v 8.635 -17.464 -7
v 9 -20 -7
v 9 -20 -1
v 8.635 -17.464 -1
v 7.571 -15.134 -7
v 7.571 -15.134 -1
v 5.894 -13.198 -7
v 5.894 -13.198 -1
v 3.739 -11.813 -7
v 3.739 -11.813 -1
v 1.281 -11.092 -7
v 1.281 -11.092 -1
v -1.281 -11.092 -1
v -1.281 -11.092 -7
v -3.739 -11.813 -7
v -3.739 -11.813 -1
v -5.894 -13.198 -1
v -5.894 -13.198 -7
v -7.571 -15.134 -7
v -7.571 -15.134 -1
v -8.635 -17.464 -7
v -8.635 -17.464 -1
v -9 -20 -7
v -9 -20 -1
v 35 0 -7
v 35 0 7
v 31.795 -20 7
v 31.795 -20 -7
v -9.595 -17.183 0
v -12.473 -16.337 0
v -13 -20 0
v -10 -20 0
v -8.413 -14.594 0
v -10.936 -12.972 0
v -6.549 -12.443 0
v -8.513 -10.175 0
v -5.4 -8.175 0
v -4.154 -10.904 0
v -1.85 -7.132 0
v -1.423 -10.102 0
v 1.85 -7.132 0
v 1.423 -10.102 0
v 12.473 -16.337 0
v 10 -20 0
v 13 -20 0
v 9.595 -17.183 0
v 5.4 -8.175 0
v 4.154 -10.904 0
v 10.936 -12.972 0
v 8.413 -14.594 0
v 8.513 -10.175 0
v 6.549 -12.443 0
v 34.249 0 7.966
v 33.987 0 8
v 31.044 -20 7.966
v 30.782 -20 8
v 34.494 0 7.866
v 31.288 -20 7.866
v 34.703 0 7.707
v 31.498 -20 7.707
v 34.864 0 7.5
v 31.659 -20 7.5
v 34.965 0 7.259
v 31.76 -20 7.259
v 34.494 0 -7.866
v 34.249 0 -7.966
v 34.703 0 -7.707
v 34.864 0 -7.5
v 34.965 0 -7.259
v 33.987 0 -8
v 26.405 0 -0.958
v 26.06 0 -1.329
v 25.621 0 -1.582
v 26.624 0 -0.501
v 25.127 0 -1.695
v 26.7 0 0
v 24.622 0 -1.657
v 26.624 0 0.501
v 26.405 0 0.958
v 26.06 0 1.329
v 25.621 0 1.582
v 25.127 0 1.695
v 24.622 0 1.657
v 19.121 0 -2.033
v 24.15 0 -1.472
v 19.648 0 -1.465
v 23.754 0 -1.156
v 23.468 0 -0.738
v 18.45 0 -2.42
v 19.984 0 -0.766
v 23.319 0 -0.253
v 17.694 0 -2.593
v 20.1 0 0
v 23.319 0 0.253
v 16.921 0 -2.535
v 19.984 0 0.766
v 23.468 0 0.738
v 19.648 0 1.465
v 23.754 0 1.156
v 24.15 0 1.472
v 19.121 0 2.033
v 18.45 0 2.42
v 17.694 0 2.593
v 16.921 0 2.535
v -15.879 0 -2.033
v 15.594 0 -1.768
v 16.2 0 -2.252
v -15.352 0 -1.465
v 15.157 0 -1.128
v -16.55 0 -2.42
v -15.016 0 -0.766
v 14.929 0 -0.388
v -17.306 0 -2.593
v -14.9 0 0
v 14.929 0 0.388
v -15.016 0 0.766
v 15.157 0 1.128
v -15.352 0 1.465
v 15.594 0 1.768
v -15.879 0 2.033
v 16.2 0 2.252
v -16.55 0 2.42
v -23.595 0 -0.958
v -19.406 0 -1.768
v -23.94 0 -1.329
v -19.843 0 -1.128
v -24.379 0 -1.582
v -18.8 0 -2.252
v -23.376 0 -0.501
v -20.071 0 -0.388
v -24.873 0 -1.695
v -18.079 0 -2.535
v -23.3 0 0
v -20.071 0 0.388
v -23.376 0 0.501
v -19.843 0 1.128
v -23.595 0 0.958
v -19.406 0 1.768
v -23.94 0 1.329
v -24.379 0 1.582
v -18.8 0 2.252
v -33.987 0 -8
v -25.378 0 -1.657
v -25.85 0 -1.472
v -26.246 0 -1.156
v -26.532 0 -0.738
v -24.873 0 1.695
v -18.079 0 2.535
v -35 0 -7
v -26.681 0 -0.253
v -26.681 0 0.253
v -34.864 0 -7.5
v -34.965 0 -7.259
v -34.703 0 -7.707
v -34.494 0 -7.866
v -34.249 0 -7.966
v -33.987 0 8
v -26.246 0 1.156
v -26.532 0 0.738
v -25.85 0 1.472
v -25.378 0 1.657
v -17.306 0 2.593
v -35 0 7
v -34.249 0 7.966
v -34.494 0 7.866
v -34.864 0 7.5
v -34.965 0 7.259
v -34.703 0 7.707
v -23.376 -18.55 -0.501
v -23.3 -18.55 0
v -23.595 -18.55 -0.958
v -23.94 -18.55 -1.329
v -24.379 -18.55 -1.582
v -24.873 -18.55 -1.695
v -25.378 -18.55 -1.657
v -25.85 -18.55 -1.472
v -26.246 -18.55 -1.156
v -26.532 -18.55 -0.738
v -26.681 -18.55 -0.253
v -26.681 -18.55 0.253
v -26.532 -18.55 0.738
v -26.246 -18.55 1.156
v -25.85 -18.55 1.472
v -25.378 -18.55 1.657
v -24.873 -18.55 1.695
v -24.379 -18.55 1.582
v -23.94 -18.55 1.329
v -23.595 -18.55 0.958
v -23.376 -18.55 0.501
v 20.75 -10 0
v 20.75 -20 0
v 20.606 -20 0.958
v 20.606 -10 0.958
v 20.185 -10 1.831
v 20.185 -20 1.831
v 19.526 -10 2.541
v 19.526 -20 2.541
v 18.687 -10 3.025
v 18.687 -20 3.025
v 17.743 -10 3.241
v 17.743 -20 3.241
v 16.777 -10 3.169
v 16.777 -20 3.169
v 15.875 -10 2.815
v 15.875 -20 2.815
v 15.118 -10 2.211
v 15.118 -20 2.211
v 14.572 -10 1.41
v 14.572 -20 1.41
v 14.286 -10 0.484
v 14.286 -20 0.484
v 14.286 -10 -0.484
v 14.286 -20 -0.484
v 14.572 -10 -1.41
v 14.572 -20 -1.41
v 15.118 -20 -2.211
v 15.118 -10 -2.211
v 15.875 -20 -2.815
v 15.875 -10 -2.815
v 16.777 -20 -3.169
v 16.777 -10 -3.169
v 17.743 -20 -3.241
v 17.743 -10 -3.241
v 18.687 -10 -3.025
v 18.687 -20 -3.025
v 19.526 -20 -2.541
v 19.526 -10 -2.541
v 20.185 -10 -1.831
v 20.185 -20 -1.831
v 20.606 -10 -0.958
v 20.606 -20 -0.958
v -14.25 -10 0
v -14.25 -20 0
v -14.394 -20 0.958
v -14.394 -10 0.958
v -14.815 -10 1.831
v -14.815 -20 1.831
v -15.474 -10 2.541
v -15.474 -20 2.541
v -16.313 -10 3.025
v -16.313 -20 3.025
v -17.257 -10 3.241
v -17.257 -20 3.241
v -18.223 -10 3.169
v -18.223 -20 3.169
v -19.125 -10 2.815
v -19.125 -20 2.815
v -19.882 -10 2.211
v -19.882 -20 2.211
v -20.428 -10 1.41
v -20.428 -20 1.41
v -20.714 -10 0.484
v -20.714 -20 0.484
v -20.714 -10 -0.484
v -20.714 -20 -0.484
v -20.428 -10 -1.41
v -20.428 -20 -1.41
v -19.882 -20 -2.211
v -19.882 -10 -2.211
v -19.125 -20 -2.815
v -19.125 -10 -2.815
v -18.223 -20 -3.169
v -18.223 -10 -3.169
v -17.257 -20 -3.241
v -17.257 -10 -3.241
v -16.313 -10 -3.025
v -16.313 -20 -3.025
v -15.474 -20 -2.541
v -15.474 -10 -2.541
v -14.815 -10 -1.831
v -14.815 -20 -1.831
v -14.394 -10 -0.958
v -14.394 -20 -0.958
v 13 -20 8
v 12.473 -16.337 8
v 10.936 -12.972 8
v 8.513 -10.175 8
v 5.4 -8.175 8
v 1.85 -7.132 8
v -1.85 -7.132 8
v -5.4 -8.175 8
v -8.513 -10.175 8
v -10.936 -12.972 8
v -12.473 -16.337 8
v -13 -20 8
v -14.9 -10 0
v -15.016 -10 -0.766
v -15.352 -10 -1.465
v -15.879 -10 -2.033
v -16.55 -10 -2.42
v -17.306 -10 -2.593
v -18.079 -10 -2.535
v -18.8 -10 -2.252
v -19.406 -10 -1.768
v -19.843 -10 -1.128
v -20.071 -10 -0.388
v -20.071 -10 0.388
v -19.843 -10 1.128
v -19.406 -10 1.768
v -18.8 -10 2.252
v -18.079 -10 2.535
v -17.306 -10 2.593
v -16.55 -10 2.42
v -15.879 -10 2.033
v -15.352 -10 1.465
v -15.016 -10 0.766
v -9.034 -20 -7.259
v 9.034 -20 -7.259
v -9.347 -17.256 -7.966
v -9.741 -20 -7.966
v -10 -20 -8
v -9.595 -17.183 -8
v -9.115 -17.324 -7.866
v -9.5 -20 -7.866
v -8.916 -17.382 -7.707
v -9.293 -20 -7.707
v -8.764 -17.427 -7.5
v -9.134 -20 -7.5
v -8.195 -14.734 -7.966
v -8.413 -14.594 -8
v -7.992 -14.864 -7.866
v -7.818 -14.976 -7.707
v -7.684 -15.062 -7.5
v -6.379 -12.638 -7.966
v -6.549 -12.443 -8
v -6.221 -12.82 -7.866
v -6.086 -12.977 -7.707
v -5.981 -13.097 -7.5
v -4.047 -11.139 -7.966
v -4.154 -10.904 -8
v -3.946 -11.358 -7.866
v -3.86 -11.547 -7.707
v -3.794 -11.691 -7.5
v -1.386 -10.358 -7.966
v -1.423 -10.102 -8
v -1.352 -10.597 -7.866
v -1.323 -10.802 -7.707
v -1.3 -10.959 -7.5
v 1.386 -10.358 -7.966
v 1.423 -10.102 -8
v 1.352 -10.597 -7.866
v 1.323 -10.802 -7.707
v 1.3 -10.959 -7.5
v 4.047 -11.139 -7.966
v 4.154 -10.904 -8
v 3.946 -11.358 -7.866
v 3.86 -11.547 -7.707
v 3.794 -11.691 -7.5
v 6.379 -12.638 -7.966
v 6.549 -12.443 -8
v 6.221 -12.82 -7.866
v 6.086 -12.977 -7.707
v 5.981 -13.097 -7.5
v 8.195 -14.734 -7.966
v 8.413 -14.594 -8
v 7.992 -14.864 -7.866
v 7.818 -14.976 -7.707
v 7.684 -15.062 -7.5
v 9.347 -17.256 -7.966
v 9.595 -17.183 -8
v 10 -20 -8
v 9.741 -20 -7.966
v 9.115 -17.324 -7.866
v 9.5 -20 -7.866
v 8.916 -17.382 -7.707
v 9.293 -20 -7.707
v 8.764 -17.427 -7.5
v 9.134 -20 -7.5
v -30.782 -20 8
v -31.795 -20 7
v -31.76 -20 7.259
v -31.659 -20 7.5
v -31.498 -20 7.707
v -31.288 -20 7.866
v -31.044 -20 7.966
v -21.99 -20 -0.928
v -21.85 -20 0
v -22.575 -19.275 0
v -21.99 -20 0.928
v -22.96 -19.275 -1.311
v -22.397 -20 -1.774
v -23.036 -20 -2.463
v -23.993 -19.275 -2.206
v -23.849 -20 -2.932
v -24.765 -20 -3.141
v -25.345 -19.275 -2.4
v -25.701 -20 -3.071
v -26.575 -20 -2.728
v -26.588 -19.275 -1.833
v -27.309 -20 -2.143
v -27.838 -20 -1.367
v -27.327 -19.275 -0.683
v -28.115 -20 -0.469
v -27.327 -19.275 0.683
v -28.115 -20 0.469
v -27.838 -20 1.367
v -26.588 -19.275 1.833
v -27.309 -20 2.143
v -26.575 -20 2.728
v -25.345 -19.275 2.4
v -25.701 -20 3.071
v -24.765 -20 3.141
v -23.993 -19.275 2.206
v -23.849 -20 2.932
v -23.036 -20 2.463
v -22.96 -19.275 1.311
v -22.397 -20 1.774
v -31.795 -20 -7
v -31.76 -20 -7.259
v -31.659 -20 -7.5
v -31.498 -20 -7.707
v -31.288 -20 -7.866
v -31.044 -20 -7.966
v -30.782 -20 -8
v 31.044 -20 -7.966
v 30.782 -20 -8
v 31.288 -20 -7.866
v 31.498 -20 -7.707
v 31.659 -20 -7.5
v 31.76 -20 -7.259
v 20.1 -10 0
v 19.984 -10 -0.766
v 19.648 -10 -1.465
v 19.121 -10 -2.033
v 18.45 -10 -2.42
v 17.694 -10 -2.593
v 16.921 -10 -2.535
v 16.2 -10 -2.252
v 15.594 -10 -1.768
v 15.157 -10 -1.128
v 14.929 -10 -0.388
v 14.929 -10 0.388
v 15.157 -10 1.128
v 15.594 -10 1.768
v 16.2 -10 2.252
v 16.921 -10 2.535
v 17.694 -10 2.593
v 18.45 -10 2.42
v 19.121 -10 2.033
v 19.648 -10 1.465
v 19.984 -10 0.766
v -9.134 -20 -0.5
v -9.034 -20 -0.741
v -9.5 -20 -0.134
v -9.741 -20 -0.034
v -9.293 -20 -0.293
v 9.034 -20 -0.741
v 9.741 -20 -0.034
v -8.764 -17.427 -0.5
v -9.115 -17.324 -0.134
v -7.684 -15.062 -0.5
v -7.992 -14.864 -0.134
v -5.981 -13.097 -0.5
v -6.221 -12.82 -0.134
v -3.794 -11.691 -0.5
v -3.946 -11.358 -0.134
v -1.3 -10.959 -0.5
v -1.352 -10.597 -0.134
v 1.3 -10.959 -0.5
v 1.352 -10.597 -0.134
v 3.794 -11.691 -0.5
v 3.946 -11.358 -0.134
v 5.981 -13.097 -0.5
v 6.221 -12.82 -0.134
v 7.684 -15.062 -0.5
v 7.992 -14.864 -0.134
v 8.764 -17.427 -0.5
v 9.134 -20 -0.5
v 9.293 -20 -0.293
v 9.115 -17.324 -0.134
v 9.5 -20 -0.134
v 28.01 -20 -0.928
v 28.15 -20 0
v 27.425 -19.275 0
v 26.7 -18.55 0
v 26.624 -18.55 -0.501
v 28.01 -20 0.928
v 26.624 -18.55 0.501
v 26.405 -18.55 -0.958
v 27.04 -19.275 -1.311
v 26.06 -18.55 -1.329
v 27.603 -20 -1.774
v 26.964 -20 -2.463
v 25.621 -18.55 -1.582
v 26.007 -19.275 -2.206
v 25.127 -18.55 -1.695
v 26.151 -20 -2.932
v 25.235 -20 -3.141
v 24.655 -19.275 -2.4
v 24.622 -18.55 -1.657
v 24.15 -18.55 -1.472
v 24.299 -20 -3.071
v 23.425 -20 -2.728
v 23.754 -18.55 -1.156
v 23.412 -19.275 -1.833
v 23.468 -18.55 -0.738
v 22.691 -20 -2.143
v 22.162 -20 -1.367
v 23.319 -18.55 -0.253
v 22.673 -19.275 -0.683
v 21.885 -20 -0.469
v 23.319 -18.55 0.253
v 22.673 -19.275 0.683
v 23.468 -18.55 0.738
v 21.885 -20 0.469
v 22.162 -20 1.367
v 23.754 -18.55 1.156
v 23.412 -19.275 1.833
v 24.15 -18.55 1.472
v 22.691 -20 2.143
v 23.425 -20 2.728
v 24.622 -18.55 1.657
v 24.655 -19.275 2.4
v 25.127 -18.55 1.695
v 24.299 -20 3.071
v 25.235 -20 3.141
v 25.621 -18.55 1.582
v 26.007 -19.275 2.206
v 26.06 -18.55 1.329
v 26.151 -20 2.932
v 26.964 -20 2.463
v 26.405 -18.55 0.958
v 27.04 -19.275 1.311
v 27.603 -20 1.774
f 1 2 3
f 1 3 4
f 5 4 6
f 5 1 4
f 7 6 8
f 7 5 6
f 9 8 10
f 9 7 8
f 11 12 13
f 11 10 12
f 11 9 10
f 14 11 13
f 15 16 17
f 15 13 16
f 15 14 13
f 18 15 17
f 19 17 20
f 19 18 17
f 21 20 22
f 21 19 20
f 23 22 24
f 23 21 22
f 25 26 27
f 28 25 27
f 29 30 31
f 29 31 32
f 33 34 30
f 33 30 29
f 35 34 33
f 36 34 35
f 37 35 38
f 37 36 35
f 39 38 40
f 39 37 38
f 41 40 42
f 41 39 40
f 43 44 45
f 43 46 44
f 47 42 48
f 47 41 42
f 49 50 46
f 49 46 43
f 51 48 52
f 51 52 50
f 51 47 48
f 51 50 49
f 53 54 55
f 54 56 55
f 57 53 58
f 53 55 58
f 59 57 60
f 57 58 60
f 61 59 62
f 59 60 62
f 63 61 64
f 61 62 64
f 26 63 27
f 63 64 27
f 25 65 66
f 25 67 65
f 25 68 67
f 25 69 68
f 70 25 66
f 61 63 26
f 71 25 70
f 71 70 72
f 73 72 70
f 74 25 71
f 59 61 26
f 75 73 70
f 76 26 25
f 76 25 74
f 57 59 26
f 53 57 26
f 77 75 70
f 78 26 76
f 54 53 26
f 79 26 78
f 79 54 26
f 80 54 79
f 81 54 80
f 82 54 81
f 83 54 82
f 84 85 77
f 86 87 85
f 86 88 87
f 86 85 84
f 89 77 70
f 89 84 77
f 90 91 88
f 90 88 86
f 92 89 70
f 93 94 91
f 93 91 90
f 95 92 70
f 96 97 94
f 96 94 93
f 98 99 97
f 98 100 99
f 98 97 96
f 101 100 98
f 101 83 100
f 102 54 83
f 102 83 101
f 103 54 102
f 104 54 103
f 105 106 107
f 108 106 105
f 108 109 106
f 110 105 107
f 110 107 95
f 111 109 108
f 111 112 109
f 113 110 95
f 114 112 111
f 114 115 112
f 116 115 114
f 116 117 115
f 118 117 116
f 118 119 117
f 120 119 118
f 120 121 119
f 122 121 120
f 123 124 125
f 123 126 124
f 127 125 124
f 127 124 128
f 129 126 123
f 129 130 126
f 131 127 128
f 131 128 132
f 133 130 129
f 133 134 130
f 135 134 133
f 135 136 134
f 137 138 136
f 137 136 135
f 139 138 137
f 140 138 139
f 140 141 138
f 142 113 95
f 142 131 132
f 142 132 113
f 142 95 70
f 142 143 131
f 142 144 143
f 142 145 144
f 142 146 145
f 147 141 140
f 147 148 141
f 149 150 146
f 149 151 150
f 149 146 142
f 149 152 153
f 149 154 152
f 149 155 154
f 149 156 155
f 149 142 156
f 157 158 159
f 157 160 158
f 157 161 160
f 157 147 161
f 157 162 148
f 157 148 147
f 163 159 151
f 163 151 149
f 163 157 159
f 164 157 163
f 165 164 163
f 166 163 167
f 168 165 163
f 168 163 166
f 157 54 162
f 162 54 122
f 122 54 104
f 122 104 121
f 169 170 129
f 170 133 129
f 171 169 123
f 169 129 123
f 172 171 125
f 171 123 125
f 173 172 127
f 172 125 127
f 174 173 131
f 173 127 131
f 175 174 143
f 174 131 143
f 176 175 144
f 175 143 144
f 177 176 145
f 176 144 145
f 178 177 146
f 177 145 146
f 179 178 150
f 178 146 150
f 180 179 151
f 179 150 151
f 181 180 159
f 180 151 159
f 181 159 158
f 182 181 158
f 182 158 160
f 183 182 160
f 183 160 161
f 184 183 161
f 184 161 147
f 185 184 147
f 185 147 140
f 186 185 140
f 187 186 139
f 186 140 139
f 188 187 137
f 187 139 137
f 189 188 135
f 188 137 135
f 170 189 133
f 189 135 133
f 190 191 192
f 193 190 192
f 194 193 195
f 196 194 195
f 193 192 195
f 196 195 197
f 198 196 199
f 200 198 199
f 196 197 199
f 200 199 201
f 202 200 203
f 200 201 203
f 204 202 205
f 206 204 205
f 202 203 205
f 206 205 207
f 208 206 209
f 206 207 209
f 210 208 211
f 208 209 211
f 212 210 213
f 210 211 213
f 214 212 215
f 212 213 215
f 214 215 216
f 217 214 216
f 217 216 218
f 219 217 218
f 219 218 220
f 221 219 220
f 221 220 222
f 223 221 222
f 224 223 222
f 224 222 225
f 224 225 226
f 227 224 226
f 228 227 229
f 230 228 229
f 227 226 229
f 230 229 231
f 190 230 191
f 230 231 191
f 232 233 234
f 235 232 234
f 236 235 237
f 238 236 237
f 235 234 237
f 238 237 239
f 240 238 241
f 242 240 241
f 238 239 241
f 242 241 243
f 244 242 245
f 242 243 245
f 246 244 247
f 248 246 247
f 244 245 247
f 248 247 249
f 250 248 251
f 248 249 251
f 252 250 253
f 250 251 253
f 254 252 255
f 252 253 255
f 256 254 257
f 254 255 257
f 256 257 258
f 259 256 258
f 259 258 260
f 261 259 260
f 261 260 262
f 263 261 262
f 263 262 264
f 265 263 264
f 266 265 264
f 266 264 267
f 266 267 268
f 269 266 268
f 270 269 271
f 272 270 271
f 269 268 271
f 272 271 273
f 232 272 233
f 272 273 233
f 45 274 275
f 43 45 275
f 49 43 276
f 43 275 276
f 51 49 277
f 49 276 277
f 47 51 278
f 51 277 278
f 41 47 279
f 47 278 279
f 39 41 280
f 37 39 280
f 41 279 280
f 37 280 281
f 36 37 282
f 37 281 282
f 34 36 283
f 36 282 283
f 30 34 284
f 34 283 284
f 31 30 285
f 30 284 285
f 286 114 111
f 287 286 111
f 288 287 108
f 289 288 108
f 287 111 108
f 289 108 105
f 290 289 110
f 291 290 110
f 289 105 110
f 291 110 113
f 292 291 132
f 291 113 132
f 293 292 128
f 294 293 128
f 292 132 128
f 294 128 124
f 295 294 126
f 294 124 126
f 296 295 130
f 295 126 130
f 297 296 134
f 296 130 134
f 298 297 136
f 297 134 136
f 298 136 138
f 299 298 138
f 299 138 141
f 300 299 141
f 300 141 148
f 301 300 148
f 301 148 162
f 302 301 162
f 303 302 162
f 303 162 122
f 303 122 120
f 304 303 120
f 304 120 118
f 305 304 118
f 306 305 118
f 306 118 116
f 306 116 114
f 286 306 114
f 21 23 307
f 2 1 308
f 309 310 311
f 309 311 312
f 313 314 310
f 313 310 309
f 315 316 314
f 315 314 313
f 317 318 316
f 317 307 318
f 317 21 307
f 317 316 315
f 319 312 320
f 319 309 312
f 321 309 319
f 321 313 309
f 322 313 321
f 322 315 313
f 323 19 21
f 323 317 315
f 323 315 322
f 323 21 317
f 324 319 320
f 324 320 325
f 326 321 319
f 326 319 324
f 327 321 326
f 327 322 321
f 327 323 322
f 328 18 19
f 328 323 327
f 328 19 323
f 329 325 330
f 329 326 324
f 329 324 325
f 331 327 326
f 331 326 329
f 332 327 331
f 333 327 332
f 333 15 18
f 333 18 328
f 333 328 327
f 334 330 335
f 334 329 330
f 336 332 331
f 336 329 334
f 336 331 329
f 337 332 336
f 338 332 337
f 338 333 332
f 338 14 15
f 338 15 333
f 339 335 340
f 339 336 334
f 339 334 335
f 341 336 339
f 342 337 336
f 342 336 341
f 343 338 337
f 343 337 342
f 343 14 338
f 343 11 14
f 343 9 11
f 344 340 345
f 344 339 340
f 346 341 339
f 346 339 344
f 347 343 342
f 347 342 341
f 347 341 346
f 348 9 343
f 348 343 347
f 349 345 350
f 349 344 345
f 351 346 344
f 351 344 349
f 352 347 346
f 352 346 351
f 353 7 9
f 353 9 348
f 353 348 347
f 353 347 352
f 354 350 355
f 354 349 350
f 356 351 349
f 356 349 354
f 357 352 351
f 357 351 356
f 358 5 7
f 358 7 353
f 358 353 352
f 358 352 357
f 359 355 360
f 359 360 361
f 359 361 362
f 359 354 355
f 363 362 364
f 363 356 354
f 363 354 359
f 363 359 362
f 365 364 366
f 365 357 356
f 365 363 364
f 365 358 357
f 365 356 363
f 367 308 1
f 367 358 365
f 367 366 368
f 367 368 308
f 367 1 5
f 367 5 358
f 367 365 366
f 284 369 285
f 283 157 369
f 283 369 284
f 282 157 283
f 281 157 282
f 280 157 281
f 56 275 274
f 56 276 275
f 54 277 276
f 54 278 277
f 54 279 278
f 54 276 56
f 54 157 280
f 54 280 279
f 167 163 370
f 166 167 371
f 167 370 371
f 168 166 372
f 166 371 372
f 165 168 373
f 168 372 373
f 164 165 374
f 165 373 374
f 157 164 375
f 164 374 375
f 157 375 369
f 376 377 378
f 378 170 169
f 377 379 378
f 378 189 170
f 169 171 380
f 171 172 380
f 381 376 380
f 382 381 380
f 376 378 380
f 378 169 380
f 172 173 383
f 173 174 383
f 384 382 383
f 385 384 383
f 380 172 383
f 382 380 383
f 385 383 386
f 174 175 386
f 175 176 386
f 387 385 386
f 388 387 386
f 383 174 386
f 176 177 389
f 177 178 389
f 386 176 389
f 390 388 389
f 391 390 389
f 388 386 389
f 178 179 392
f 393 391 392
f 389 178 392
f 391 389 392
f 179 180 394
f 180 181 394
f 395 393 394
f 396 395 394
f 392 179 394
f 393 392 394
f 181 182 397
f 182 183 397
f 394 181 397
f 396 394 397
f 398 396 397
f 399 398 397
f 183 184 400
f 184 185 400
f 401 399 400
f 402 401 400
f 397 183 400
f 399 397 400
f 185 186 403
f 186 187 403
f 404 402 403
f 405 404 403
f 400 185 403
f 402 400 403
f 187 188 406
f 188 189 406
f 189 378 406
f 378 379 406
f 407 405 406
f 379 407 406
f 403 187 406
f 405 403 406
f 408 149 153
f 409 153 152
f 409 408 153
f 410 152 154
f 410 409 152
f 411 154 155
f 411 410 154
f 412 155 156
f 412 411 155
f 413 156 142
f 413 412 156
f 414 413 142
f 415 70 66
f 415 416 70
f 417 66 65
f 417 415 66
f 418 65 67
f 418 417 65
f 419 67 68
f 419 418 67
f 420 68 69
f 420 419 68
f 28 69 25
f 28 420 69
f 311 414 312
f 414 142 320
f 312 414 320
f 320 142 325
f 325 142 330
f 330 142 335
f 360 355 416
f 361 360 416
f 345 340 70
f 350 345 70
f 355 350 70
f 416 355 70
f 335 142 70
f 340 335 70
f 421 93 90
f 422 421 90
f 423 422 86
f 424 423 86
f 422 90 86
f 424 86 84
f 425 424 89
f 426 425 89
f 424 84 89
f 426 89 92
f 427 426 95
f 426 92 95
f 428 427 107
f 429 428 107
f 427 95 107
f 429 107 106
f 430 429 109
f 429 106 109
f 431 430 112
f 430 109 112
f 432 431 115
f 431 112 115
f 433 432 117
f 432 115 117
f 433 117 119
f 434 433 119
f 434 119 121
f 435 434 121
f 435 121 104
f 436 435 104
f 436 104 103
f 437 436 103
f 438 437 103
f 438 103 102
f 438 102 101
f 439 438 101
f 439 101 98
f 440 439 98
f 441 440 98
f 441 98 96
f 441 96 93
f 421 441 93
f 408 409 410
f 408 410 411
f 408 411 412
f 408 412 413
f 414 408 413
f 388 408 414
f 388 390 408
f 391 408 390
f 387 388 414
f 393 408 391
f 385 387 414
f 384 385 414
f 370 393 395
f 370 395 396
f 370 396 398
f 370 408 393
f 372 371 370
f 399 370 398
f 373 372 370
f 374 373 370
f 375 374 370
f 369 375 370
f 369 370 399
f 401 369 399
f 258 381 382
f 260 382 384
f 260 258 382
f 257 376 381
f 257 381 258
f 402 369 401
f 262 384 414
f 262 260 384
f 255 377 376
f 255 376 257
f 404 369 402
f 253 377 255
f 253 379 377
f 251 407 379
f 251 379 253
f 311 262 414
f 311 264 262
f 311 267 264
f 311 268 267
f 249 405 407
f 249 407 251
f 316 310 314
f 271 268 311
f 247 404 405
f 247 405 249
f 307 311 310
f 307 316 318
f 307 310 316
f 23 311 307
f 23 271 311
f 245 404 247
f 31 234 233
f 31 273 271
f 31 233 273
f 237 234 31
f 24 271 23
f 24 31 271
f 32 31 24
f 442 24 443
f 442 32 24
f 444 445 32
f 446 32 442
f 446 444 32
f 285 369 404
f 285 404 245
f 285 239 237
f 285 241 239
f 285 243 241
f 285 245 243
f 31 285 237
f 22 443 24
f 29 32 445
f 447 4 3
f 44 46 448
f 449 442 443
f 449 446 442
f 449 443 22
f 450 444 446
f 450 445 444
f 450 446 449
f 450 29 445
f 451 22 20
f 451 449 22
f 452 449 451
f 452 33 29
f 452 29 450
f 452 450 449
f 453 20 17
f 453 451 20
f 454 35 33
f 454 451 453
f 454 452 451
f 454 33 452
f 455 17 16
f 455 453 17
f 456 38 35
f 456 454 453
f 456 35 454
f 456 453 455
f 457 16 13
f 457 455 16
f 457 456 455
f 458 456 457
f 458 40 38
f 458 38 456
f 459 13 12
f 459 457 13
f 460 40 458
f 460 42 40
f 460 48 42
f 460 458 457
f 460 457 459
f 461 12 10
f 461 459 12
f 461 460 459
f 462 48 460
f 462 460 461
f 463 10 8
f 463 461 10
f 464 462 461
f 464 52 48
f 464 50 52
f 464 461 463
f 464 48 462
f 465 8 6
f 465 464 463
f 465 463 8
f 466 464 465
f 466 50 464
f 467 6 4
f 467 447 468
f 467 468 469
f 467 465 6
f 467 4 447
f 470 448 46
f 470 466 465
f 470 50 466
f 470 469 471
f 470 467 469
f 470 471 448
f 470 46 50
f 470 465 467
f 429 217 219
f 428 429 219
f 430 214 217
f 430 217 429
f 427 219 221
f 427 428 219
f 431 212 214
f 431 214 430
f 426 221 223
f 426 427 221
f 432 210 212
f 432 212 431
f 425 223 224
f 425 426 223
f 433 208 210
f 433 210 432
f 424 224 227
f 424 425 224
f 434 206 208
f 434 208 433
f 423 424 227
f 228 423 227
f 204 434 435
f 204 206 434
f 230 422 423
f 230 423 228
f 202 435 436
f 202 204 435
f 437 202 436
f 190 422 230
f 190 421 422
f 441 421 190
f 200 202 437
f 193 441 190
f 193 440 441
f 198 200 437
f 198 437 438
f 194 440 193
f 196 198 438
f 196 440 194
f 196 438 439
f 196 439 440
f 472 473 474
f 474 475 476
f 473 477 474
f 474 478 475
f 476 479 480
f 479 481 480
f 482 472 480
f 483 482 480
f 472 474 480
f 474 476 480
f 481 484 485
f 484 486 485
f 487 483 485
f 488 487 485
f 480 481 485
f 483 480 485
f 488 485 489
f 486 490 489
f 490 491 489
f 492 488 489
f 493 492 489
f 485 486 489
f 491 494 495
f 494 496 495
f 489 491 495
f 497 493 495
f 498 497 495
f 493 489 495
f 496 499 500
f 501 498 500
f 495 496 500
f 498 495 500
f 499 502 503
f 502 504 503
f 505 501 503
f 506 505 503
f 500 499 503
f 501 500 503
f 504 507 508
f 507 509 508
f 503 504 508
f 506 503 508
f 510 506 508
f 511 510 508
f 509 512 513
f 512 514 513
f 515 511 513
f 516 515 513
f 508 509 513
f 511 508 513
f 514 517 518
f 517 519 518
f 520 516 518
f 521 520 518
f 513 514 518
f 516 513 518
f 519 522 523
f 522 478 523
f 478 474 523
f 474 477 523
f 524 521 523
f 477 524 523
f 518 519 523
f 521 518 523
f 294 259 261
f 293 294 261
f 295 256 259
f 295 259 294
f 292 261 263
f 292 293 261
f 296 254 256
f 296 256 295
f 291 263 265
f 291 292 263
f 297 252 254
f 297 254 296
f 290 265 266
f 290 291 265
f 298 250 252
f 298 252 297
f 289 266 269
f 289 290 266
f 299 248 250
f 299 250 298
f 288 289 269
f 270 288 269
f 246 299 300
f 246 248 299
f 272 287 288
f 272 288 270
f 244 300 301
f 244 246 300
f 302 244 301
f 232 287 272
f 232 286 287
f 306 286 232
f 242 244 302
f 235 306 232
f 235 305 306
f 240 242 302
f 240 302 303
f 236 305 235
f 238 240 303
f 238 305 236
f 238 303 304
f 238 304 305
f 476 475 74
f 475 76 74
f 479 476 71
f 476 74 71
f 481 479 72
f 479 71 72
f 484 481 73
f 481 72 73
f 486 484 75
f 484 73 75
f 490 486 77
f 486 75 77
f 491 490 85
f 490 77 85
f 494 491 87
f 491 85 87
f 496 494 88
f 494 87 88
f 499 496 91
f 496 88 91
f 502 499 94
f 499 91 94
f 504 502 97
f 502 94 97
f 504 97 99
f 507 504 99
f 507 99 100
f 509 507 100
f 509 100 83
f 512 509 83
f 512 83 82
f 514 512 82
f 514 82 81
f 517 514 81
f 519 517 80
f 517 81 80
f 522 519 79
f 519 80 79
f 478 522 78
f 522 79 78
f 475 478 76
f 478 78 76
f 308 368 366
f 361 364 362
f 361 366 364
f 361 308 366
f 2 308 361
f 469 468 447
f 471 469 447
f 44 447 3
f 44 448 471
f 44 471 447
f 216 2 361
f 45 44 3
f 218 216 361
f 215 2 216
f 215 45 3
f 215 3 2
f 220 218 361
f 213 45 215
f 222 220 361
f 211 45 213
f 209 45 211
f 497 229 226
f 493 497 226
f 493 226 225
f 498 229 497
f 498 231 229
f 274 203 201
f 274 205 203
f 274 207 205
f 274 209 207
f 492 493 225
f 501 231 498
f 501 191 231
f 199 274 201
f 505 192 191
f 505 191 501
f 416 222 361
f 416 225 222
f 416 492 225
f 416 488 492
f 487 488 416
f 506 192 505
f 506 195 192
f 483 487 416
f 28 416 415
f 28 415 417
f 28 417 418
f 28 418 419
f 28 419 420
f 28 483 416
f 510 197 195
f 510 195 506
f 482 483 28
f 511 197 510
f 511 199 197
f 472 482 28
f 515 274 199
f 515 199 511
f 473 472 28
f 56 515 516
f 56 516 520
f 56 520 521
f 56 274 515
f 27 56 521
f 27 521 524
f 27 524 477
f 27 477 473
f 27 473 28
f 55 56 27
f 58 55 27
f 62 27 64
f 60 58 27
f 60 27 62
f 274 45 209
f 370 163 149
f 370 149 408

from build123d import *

# Parameters (mm, degrees)
DODANIE_WYCI_GNI_CIE1_DEPTH                          = 8
WYTNIJ_WYCI_GNI_CIE1_DEPTH                           = 8
WYTNIJ_WYCI_GNI_CIE2_DEPTH                           = 42.097445176
WYTNIJ_WYCI_GNI_CIE2_DEPTH_BACK                      = 42.097445176
POG_BIENIE_STO_KOWE_POD_M3_WKR_T_DO_CZ_C_D           = 3.4
POG_BIENIE_STO_KOWE_POD_M3_WKR_T_DO_CZ_C_CSINK_D     = 6.3
POG_BIENIE_STO_KOWE_POD_M3_WKR_T_DO_CZ_C_CSINK_ANGLE = 90
OTWORY_USTALAJ_CE_5_0MM1_D                           = 5.2
SZKIC8_R                                             = 3.25
WYTNIJ_WYCI_GNI_CIE3_DEPTH                           = 10
ZAOKR_GLENIE1_R                                      = 1


with BuildPart() as part:
    # Szkic1 → Dodanie-wyciągnięcie1 (new, symmetric)
    with BuildSketch(Plane.XY):
        Polygon((0, 0), (35, 0), (31.794871795, -20), (0, -20), align=None)
    dodanie_wyci_gni_cie1 = extrude(amount=DODANIE_WYCI_GNI_CIE1_DEPTH, both=True)

    # Lustro1: Dodanie-wyciągnięcie1 across plane
    add(dodanie_wyci_gni_cie1.mirror(Plane(origin=(0, -20, 8), x_dir=(0, 0, 1), z_dir=(1, 0, 0))))

    # Szkic2 → Wytnij-wyciągnięcie1 (cut)
    with BuildSketch(Plane.XY.offset(8)):
        with BuildLine():
            Line((-13, -20), (13, -20))
            ThreePointArc((13, -20), (0, -7), (-13, -20))
        make_face()
    extrude(amount=-WYTNIJ_WYCI_GNI_CIE1_DEPTH, mode=Mode.SUBTRACT)

    # Szkic3 → Wytnij-wyciągnięcie2 (cut, two sides: drawn at the far end of the back side and taken through both)
    with BuildSketch(Plane.XY.offset(-WYTNIJ_WYCI_GNI_CIE2_DEPTH_BACK)):
        with BuildLine():
            ThreePointArc((9, -20), (0, -11), (-9, -20))
            Line((-9, -20), (9, -20))
        make_face()
    extrude(amount=WYTNIJ_WYCI_GNI_CIE2_DEPTH + WYTNIJ_WYCI_GNI_CIE2_DEPTH_BACK, mode=Mode.SUBTRACT)

    # Pogłębienie stożkowe pod M3 wkręt do części metalowych z łbem soczewkowym1 (through all)
    with Locations(Plane(origin=(0, -20, 0), x_dir=(-1, 0, 0), z_dir=(0, -1, 0))):
        with Locations((-25, 0), (25, 0)):
            CounterSinkHole(POG_BIENIE_STO_KOWE_POD_M3_WKR_T_DO_CZ_C_D / 2, POG_BIENIE_STO_KOWE_POD_M3_WKR_T_DO_CZ_C_CSINK_D / 2, counter_sink_angle=POG_BIENIE_STO_KOWE_POD_M3_WKR_T_DO_CZ_C_CSINK_ANGLE)

    # Otwory ustalające Ø5.0mm1 (through all)
    with Locations(Plane(origin=(0, -20, 0), x_dir=(-1, 0, 0), z_dir=(0, -1, 0))):
        with Locations((-17.5, 0), (17.5, 0)):
            Hole(OTWORY_USTALAJ_CE_5_0MM1_D / 2)

    # Szkic8 → Wytnij-wyciągnięcie3 (cut)
    with BuildSketch(Plane(origin=(0, -20, 0), x_dir=(-1, 0, 0), z_dir=(0, -1, 0))):
        with Locations(Location((17.5, 0, 0), (0, 0, 180))):
            Circle(SZKIC8_R)
        with Locations(Location((-17.5, 0, 0), (0, 0, 180))):
            Circle(SZKIC8_R)
    extrude(amount=-WYTNIJ_WYCI_GNI_CIE3_DEPTH, mode=Mode.SUBTRACT)

    # Zaokrąglenie1
    zaokr_glenie1_edges = [part.edges().sort_by_distance(p)[0] for p in [
        (33.397435897, -10, 8),
        (-33.397435897, -10, 8),
        (-33.397435897, -10, -8),
        (0, -11, 0),
        (0, -11, -8),
        (33.397435897, -10, -8),
    ]]
    fillet(zaokr_glenie1_edges, radius=ZAOKR_GLENIE1_R)


solid = part.part
